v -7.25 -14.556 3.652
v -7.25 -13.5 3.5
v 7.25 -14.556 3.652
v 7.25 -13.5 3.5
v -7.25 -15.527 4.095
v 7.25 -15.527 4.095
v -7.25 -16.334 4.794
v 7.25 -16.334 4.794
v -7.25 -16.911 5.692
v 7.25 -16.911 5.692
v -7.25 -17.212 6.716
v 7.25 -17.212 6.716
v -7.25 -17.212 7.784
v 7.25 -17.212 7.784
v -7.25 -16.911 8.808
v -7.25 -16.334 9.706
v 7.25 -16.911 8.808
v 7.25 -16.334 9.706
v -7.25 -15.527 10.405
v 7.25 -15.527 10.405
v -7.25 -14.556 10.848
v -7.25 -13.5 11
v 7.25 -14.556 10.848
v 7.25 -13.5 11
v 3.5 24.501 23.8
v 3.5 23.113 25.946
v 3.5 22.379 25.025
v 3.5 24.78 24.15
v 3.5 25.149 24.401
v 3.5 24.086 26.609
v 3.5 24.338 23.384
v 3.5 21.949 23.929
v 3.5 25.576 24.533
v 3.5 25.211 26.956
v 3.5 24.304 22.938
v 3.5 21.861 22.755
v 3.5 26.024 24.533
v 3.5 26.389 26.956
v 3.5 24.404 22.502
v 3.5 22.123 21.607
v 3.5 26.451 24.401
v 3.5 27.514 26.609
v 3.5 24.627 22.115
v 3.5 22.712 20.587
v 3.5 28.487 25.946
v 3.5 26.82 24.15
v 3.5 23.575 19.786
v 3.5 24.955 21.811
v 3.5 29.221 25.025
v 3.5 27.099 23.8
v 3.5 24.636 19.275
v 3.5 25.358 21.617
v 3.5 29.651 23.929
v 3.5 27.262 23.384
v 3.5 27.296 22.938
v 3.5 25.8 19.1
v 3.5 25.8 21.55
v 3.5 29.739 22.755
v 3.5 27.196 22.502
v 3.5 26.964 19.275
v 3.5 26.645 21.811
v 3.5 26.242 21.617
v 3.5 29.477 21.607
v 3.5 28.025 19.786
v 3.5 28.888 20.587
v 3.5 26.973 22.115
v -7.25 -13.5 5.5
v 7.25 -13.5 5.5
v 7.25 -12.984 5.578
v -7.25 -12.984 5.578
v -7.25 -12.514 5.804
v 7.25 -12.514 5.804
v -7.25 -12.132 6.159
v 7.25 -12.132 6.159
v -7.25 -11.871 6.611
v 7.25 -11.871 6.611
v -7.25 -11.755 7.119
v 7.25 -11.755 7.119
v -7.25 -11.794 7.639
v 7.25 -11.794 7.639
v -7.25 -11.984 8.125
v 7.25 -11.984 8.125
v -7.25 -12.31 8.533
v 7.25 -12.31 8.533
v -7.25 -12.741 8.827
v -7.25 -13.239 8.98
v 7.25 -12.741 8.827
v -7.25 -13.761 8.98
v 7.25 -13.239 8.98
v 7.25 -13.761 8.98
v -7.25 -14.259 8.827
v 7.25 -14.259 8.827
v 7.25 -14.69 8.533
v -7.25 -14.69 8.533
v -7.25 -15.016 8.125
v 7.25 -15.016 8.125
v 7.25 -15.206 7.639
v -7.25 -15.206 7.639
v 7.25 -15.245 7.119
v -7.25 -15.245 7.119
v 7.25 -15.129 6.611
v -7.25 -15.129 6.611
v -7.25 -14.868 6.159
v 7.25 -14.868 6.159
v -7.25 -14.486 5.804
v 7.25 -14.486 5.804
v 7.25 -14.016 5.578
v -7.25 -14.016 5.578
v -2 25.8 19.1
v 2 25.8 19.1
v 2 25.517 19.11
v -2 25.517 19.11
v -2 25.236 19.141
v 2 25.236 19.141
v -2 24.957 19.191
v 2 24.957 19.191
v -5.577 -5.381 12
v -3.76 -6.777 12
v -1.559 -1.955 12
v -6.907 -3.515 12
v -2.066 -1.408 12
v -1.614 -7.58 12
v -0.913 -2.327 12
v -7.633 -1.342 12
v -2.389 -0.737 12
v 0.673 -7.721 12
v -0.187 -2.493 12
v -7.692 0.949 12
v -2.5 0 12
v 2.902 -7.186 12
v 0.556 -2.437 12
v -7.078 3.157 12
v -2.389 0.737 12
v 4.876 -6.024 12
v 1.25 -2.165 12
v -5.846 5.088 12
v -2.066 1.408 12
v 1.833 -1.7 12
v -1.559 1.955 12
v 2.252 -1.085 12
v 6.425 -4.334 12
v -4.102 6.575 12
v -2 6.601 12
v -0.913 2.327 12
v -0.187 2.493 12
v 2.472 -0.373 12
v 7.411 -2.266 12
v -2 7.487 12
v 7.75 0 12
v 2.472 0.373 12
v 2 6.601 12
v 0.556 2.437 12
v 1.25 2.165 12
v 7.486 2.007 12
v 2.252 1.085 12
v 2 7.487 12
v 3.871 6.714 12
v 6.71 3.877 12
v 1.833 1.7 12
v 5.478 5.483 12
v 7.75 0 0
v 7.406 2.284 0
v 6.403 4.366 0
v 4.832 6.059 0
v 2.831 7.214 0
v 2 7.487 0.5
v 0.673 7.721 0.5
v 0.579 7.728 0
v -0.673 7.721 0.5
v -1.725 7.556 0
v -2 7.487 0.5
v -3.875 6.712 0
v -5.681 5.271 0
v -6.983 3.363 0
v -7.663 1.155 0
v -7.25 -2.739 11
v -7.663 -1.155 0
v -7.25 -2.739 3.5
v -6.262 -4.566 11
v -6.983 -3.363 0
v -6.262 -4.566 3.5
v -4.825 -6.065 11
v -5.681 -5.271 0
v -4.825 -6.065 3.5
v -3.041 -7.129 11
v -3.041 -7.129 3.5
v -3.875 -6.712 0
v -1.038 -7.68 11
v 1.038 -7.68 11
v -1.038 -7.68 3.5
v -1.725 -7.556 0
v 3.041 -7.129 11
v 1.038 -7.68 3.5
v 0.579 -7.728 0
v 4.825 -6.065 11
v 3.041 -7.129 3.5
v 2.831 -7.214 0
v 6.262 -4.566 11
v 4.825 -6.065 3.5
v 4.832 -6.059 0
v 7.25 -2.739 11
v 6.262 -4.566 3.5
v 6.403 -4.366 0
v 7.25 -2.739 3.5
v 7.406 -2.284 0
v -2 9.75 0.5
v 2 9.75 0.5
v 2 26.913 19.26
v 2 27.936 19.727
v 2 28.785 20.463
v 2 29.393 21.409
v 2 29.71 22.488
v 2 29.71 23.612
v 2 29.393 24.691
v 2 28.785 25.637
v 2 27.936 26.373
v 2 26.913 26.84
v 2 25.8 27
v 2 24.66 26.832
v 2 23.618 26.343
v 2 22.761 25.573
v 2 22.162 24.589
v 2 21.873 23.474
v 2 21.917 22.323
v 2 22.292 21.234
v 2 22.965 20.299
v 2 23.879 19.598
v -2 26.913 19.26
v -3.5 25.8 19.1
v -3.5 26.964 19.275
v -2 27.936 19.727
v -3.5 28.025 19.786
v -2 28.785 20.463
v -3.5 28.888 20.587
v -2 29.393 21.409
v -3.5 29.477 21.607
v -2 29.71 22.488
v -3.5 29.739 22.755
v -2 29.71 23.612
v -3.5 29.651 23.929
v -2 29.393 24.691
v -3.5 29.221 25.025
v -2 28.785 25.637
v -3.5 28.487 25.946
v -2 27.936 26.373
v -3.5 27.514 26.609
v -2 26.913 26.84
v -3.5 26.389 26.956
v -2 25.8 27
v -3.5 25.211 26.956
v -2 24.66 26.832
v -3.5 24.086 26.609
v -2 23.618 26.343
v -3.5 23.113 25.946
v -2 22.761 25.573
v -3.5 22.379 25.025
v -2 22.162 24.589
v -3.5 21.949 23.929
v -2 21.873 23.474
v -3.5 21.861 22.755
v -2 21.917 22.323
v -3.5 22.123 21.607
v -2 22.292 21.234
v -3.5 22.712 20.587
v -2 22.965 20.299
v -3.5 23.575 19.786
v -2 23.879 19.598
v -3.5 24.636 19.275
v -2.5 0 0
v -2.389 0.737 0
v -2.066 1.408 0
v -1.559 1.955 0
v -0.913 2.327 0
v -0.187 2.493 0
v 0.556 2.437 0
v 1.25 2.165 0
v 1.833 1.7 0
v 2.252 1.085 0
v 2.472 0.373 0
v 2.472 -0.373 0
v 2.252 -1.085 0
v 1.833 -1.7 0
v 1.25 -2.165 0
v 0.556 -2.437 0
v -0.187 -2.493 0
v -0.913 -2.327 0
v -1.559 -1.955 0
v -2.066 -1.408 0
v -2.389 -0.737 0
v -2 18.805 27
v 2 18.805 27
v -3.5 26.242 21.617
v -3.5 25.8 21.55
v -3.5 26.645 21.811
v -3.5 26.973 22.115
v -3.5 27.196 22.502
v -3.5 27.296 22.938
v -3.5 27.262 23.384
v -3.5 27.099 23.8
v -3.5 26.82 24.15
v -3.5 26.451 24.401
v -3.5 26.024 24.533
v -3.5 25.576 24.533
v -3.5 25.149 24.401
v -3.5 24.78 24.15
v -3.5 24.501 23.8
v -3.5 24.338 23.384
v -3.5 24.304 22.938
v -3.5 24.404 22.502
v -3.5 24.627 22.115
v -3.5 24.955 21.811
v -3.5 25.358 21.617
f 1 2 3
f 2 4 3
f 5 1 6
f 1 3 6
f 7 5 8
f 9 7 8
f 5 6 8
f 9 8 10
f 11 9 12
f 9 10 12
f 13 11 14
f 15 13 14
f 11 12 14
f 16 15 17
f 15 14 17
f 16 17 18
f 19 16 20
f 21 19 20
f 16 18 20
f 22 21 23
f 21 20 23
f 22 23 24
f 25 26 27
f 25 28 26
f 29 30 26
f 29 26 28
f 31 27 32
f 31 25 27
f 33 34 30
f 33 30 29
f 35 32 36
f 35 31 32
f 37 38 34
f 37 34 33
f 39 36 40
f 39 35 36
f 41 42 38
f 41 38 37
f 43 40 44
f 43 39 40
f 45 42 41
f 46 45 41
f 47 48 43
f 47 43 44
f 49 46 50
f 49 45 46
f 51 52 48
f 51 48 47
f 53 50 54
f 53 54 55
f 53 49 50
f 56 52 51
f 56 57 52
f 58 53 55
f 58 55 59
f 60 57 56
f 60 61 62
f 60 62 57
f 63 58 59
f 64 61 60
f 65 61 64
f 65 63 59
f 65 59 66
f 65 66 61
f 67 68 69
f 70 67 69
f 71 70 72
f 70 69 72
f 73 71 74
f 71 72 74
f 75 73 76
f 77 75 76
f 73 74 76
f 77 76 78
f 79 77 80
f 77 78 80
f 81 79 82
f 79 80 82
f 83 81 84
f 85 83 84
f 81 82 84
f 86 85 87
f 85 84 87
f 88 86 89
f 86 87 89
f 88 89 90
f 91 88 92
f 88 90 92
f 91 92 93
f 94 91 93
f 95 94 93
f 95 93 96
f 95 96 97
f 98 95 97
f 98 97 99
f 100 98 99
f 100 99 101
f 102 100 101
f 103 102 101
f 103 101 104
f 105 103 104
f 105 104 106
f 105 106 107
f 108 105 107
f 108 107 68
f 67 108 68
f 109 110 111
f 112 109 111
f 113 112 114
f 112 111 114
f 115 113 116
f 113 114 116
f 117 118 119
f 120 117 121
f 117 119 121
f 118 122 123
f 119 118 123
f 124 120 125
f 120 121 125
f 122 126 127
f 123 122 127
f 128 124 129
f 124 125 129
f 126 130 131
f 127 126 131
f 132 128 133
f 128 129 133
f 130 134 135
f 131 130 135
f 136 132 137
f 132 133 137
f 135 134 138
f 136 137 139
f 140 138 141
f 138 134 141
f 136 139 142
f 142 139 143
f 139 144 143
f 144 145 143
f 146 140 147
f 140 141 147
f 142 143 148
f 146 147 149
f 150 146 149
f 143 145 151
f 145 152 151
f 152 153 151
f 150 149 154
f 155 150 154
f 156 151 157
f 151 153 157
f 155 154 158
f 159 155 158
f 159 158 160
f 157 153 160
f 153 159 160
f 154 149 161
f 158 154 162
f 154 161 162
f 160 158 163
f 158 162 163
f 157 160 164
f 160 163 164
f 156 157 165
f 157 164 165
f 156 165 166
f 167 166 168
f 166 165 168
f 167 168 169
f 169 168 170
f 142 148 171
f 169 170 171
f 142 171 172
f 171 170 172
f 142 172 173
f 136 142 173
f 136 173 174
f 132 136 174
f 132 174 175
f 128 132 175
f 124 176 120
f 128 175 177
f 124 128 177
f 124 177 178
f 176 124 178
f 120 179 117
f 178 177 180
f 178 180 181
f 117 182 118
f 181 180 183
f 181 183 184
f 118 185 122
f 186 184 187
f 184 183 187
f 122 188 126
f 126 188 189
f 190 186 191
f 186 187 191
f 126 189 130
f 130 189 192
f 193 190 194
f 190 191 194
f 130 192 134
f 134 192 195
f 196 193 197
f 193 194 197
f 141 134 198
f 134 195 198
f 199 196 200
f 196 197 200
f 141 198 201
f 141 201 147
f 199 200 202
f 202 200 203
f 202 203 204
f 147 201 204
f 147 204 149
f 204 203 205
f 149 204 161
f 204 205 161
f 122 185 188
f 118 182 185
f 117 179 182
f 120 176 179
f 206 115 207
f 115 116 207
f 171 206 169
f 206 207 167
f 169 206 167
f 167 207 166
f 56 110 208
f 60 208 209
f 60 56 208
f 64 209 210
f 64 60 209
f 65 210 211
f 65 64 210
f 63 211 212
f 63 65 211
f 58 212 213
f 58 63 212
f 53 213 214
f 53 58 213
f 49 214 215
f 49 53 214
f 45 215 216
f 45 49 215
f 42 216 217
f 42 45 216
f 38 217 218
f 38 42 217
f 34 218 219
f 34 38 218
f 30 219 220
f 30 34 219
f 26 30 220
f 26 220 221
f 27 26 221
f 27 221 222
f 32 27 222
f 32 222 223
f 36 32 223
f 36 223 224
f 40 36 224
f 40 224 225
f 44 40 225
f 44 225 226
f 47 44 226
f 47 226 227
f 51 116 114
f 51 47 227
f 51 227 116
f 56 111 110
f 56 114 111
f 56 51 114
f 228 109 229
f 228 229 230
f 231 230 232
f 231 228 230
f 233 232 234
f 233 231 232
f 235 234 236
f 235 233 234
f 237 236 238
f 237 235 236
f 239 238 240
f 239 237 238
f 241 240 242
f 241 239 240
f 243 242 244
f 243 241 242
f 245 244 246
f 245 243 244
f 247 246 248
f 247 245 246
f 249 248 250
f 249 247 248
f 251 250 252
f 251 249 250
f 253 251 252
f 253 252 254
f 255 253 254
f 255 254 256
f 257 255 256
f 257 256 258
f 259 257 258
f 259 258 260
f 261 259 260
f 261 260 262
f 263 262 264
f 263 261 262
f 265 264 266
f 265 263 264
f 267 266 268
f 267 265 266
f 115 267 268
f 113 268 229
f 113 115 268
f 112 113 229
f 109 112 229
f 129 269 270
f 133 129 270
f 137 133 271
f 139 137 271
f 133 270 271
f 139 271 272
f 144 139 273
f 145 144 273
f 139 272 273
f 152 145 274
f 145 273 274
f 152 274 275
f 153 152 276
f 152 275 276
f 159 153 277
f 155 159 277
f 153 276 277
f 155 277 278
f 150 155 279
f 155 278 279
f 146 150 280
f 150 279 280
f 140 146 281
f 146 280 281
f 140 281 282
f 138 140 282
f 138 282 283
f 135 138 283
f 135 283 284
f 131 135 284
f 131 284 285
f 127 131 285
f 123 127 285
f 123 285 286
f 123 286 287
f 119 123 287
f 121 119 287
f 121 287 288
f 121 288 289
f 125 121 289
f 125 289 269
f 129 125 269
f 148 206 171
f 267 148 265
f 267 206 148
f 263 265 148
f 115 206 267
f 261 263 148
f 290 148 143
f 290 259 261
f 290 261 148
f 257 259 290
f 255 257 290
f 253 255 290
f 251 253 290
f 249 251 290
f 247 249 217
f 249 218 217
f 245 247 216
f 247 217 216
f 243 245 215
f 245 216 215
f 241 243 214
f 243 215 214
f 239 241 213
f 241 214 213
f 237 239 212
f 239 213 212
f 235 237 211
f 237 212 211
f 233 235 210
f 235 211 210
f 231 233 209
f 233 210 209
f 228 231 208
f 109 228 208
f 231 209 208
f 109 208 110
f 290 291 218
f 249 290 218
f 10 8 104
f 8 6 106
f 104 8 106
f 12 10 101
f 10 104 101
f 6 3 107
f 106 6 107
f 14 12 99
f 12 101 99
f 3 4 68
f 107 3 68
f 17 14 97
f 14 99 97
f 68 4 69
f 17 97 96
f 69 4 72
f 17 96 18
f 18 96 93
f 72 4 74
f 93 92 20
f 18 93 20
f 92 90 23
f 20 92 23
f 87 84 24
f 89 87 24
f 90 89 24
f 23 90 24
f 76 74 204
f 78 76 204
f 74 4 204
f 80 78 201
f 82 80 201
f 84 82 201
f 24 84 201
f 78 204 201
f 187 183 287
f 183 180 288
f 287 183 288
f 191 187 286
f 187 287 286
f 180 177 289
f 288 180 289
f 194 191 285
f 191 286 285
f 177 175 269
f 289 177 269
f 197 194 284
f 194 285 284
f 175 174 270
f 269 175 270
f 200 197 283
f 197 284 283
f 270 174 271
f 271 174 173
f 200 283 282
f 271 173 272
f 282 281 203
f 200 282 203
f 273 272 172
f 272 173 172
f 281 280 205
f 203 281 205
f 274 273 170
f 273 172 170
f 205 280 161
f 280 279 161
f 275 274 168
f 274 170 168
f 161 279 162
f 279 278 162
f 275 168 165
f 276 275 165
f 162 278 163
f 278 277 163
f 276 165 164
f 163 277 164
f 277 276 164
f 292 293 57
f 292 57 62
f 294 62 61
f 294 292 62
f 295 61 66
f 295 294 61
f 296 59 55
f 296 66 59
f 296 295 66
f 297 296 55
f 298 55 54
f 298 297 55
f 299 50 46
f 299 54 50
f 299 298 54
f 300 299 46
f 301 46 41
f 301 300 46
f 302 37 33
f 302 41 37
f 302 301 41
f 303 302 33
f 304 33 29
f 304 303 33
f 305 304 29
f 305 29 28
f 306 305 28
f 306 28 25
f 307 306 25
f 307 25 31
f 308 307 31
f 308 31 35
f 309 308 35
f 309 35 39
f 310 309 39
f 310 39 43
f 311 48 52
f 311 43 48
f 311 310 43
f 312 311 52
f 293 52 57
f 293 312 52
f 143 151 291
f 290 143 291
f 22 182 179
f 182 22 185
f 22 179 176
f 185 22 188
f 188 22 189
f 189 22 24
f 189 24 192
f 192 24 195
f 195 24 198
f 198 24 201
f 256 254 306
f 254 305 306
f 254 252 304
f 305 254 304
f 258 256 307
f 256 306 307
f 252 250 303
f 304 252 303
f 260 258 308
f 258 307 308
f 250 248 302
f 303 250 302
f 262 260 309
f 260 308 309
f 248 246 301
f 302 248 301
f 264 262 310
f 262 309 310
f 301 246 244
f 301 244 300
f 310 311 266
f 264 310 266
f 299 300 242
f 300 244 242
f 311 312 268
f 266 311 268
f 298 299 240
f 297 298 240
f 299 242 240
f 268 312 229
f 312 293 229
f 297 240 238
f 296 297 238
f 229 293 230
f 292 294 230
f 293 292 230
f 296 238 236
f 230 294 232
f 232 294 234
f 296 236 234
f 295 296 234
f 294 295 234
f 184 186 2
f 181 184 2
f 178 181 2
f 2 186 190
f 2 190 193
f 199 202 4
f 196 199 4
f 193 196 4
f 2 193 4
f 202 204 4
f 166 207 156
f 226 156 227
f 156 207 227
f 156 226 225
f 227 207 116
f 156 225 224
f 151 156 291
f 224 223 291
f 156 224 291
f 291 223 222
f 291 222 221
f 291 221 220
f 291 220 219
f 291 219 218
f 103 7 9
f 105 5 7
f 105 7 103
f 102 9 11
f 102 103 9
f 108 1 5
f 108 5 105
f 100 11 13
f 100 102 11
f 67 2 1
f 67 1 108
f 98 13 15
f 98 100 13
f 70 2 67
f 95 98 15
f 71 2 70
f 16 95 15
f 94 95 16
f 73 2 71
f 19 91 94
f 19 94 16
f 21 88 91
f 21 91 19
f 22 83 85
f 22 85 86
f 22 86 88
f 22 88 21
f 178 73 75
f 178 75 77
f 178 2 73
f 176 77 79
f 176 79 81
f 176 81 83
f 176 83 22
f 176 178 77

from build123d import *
from build123d.topology import SkipClean

# Parameters (mm, degrees)
SKETCH1_R            = 7.75
MAIN_CYLINDER_DEPTH  = 12
DROP_DEPTH           = 7.25
RISER_DEPTH          = 2
SKETCH5_R            = 3.95
RISER_BOSS_DEPTH     = 3.5
TOP_HOLES_DEPTH      = 42.720798171
TOP_HOLES_DEPTH_BACK = 42.720798171
SKETCH6_R            = 1.5
SKETCH7_R            = 1.75
BOTTOM_HOLES_DEPTH   = 43.884291996
SKETCH8_R            = 2.5
BEARING_HOLE_DEPTH   = 41.916072637


with BuildPart() as part:
    # Sketch1 → Main Cylinder (new body)
    with BuildSketch(Plane.XY):
        Circle(SKETCH1_R)
    extrude(amount=MAIN_CYLINDER_DEPTH)

    # Sketch2 → Drop (add, symmetric)
    with BuildSketch(Plane(origin=(0, 0, 0), x_dir=(0, 0, -1), z_dir=(1, 0, 0))):
        with BuildLine():
            Line((-3.5, -2.013895629), (-3.5, -13.5))
            ThreePointArc((-3.5, -13.5), (-7.25, -17.25), (-11, -13.5))
            Line((-11, -13.5), (-11, -2.013895629))
            Line((-11, -2.013895629), (-3.5, -2.013895629))
        make_face()
    extrude(amount=DROP_DEPTH, both=True)

    # Sketch3 → Riser (add, symmetric)
    with BuildSketch(Plane(origin=(0, 0, 0), x_dir=(0, 0, -1), z_dir=(1, 0, 0))):
        with BuildLine():
            Line((-27, 18.805363243), (-27, 25.8))
            ThreePointArc((-27, 25.8), (-22.625995284, 29.727177103), (-19.191027848, 24.956890322))
            Line((-19.191027848, 24.956890322), (-0.5, 9.75))
            Line((-0.5, 9.75), (-0.5, 5.606009061))
            Line((-0.5, 5.606009061), (-12, 5.606009061))
            Line((-12, 5.606009061), (-12, 6.601467519))
            Line((-12, 6.601467519), (-27, 18.805363243))
        make_face()
    extrude(amount=RISER_DEPTH, both=True)

    # Sketch5 → Riser Boss (add, symmetric)
    with SkipClean():  # the faces are left unmerged after this step: merging them gives an invalid solid
        with BuildSketch(Plane(origin=(0, 0, 0), x_dir=(0, 0, -1), z_dir=(1, 0, 0))):
            with Locations((-23.05, 25.8)):
                Circle(SKETCH5_R)
        extrude(amount=RISER_BOSS_DEPTH, both=True)

    # Sketch6 → Top Holes (cut, two sides: drawn at the far end of the back side and taken through both)
    with SkipClean():  # the faces are left unmerged after this step: merging them gives an invalid solid
        with BuildSketch(Plane(origin=(3.5, 0, 0), x_dir=(0, 0, -1), z_dir=(1, 0, 0)).offset(-TOP_HOLES_DEPTH_BACK)):
            with Locations((-23.05, 25.8)):
                Circle(SKETCH6_R)
        extrude(amount=TOP_HOLES_DEPTH + TOP_HOLES_DEPTH_BACK, mode=Mode.SUBTRACT)

    # Sketch7 → Bottom Holes (cut, through all)
    with SkipClean():  # the faces are left unmerged after this step: merging them gives an invalid solid
        with BuildSketch(Plane(origin=(7.25, 0, 0), x_dir=(0, 0, -1), z_dir=(1, 0, 0))):
            with Locations((-7.25, -13.5)):
                Circle(SKETCH7_R)
        extrude(amount=-BOTTOM_HOLES_DEPTH, mode=Mode.SUBTRACT)

    # Sketch8 → Bearing Hole (cut, through all)
    with SkipClean():  # the faces are left unmerged after this step: merging them gives an invalid solid
        with BuildSketch(Plane(origin=(0, 0, 0), x_dir=(-1, 0, 0), z_dir=(0, 0, -1))):
            Circle(SKETCH8_R)
        extrude(amount=-BEARING_HOLE_DEPTH, mode=Mode.SUBTRACT)


solid = part.part
